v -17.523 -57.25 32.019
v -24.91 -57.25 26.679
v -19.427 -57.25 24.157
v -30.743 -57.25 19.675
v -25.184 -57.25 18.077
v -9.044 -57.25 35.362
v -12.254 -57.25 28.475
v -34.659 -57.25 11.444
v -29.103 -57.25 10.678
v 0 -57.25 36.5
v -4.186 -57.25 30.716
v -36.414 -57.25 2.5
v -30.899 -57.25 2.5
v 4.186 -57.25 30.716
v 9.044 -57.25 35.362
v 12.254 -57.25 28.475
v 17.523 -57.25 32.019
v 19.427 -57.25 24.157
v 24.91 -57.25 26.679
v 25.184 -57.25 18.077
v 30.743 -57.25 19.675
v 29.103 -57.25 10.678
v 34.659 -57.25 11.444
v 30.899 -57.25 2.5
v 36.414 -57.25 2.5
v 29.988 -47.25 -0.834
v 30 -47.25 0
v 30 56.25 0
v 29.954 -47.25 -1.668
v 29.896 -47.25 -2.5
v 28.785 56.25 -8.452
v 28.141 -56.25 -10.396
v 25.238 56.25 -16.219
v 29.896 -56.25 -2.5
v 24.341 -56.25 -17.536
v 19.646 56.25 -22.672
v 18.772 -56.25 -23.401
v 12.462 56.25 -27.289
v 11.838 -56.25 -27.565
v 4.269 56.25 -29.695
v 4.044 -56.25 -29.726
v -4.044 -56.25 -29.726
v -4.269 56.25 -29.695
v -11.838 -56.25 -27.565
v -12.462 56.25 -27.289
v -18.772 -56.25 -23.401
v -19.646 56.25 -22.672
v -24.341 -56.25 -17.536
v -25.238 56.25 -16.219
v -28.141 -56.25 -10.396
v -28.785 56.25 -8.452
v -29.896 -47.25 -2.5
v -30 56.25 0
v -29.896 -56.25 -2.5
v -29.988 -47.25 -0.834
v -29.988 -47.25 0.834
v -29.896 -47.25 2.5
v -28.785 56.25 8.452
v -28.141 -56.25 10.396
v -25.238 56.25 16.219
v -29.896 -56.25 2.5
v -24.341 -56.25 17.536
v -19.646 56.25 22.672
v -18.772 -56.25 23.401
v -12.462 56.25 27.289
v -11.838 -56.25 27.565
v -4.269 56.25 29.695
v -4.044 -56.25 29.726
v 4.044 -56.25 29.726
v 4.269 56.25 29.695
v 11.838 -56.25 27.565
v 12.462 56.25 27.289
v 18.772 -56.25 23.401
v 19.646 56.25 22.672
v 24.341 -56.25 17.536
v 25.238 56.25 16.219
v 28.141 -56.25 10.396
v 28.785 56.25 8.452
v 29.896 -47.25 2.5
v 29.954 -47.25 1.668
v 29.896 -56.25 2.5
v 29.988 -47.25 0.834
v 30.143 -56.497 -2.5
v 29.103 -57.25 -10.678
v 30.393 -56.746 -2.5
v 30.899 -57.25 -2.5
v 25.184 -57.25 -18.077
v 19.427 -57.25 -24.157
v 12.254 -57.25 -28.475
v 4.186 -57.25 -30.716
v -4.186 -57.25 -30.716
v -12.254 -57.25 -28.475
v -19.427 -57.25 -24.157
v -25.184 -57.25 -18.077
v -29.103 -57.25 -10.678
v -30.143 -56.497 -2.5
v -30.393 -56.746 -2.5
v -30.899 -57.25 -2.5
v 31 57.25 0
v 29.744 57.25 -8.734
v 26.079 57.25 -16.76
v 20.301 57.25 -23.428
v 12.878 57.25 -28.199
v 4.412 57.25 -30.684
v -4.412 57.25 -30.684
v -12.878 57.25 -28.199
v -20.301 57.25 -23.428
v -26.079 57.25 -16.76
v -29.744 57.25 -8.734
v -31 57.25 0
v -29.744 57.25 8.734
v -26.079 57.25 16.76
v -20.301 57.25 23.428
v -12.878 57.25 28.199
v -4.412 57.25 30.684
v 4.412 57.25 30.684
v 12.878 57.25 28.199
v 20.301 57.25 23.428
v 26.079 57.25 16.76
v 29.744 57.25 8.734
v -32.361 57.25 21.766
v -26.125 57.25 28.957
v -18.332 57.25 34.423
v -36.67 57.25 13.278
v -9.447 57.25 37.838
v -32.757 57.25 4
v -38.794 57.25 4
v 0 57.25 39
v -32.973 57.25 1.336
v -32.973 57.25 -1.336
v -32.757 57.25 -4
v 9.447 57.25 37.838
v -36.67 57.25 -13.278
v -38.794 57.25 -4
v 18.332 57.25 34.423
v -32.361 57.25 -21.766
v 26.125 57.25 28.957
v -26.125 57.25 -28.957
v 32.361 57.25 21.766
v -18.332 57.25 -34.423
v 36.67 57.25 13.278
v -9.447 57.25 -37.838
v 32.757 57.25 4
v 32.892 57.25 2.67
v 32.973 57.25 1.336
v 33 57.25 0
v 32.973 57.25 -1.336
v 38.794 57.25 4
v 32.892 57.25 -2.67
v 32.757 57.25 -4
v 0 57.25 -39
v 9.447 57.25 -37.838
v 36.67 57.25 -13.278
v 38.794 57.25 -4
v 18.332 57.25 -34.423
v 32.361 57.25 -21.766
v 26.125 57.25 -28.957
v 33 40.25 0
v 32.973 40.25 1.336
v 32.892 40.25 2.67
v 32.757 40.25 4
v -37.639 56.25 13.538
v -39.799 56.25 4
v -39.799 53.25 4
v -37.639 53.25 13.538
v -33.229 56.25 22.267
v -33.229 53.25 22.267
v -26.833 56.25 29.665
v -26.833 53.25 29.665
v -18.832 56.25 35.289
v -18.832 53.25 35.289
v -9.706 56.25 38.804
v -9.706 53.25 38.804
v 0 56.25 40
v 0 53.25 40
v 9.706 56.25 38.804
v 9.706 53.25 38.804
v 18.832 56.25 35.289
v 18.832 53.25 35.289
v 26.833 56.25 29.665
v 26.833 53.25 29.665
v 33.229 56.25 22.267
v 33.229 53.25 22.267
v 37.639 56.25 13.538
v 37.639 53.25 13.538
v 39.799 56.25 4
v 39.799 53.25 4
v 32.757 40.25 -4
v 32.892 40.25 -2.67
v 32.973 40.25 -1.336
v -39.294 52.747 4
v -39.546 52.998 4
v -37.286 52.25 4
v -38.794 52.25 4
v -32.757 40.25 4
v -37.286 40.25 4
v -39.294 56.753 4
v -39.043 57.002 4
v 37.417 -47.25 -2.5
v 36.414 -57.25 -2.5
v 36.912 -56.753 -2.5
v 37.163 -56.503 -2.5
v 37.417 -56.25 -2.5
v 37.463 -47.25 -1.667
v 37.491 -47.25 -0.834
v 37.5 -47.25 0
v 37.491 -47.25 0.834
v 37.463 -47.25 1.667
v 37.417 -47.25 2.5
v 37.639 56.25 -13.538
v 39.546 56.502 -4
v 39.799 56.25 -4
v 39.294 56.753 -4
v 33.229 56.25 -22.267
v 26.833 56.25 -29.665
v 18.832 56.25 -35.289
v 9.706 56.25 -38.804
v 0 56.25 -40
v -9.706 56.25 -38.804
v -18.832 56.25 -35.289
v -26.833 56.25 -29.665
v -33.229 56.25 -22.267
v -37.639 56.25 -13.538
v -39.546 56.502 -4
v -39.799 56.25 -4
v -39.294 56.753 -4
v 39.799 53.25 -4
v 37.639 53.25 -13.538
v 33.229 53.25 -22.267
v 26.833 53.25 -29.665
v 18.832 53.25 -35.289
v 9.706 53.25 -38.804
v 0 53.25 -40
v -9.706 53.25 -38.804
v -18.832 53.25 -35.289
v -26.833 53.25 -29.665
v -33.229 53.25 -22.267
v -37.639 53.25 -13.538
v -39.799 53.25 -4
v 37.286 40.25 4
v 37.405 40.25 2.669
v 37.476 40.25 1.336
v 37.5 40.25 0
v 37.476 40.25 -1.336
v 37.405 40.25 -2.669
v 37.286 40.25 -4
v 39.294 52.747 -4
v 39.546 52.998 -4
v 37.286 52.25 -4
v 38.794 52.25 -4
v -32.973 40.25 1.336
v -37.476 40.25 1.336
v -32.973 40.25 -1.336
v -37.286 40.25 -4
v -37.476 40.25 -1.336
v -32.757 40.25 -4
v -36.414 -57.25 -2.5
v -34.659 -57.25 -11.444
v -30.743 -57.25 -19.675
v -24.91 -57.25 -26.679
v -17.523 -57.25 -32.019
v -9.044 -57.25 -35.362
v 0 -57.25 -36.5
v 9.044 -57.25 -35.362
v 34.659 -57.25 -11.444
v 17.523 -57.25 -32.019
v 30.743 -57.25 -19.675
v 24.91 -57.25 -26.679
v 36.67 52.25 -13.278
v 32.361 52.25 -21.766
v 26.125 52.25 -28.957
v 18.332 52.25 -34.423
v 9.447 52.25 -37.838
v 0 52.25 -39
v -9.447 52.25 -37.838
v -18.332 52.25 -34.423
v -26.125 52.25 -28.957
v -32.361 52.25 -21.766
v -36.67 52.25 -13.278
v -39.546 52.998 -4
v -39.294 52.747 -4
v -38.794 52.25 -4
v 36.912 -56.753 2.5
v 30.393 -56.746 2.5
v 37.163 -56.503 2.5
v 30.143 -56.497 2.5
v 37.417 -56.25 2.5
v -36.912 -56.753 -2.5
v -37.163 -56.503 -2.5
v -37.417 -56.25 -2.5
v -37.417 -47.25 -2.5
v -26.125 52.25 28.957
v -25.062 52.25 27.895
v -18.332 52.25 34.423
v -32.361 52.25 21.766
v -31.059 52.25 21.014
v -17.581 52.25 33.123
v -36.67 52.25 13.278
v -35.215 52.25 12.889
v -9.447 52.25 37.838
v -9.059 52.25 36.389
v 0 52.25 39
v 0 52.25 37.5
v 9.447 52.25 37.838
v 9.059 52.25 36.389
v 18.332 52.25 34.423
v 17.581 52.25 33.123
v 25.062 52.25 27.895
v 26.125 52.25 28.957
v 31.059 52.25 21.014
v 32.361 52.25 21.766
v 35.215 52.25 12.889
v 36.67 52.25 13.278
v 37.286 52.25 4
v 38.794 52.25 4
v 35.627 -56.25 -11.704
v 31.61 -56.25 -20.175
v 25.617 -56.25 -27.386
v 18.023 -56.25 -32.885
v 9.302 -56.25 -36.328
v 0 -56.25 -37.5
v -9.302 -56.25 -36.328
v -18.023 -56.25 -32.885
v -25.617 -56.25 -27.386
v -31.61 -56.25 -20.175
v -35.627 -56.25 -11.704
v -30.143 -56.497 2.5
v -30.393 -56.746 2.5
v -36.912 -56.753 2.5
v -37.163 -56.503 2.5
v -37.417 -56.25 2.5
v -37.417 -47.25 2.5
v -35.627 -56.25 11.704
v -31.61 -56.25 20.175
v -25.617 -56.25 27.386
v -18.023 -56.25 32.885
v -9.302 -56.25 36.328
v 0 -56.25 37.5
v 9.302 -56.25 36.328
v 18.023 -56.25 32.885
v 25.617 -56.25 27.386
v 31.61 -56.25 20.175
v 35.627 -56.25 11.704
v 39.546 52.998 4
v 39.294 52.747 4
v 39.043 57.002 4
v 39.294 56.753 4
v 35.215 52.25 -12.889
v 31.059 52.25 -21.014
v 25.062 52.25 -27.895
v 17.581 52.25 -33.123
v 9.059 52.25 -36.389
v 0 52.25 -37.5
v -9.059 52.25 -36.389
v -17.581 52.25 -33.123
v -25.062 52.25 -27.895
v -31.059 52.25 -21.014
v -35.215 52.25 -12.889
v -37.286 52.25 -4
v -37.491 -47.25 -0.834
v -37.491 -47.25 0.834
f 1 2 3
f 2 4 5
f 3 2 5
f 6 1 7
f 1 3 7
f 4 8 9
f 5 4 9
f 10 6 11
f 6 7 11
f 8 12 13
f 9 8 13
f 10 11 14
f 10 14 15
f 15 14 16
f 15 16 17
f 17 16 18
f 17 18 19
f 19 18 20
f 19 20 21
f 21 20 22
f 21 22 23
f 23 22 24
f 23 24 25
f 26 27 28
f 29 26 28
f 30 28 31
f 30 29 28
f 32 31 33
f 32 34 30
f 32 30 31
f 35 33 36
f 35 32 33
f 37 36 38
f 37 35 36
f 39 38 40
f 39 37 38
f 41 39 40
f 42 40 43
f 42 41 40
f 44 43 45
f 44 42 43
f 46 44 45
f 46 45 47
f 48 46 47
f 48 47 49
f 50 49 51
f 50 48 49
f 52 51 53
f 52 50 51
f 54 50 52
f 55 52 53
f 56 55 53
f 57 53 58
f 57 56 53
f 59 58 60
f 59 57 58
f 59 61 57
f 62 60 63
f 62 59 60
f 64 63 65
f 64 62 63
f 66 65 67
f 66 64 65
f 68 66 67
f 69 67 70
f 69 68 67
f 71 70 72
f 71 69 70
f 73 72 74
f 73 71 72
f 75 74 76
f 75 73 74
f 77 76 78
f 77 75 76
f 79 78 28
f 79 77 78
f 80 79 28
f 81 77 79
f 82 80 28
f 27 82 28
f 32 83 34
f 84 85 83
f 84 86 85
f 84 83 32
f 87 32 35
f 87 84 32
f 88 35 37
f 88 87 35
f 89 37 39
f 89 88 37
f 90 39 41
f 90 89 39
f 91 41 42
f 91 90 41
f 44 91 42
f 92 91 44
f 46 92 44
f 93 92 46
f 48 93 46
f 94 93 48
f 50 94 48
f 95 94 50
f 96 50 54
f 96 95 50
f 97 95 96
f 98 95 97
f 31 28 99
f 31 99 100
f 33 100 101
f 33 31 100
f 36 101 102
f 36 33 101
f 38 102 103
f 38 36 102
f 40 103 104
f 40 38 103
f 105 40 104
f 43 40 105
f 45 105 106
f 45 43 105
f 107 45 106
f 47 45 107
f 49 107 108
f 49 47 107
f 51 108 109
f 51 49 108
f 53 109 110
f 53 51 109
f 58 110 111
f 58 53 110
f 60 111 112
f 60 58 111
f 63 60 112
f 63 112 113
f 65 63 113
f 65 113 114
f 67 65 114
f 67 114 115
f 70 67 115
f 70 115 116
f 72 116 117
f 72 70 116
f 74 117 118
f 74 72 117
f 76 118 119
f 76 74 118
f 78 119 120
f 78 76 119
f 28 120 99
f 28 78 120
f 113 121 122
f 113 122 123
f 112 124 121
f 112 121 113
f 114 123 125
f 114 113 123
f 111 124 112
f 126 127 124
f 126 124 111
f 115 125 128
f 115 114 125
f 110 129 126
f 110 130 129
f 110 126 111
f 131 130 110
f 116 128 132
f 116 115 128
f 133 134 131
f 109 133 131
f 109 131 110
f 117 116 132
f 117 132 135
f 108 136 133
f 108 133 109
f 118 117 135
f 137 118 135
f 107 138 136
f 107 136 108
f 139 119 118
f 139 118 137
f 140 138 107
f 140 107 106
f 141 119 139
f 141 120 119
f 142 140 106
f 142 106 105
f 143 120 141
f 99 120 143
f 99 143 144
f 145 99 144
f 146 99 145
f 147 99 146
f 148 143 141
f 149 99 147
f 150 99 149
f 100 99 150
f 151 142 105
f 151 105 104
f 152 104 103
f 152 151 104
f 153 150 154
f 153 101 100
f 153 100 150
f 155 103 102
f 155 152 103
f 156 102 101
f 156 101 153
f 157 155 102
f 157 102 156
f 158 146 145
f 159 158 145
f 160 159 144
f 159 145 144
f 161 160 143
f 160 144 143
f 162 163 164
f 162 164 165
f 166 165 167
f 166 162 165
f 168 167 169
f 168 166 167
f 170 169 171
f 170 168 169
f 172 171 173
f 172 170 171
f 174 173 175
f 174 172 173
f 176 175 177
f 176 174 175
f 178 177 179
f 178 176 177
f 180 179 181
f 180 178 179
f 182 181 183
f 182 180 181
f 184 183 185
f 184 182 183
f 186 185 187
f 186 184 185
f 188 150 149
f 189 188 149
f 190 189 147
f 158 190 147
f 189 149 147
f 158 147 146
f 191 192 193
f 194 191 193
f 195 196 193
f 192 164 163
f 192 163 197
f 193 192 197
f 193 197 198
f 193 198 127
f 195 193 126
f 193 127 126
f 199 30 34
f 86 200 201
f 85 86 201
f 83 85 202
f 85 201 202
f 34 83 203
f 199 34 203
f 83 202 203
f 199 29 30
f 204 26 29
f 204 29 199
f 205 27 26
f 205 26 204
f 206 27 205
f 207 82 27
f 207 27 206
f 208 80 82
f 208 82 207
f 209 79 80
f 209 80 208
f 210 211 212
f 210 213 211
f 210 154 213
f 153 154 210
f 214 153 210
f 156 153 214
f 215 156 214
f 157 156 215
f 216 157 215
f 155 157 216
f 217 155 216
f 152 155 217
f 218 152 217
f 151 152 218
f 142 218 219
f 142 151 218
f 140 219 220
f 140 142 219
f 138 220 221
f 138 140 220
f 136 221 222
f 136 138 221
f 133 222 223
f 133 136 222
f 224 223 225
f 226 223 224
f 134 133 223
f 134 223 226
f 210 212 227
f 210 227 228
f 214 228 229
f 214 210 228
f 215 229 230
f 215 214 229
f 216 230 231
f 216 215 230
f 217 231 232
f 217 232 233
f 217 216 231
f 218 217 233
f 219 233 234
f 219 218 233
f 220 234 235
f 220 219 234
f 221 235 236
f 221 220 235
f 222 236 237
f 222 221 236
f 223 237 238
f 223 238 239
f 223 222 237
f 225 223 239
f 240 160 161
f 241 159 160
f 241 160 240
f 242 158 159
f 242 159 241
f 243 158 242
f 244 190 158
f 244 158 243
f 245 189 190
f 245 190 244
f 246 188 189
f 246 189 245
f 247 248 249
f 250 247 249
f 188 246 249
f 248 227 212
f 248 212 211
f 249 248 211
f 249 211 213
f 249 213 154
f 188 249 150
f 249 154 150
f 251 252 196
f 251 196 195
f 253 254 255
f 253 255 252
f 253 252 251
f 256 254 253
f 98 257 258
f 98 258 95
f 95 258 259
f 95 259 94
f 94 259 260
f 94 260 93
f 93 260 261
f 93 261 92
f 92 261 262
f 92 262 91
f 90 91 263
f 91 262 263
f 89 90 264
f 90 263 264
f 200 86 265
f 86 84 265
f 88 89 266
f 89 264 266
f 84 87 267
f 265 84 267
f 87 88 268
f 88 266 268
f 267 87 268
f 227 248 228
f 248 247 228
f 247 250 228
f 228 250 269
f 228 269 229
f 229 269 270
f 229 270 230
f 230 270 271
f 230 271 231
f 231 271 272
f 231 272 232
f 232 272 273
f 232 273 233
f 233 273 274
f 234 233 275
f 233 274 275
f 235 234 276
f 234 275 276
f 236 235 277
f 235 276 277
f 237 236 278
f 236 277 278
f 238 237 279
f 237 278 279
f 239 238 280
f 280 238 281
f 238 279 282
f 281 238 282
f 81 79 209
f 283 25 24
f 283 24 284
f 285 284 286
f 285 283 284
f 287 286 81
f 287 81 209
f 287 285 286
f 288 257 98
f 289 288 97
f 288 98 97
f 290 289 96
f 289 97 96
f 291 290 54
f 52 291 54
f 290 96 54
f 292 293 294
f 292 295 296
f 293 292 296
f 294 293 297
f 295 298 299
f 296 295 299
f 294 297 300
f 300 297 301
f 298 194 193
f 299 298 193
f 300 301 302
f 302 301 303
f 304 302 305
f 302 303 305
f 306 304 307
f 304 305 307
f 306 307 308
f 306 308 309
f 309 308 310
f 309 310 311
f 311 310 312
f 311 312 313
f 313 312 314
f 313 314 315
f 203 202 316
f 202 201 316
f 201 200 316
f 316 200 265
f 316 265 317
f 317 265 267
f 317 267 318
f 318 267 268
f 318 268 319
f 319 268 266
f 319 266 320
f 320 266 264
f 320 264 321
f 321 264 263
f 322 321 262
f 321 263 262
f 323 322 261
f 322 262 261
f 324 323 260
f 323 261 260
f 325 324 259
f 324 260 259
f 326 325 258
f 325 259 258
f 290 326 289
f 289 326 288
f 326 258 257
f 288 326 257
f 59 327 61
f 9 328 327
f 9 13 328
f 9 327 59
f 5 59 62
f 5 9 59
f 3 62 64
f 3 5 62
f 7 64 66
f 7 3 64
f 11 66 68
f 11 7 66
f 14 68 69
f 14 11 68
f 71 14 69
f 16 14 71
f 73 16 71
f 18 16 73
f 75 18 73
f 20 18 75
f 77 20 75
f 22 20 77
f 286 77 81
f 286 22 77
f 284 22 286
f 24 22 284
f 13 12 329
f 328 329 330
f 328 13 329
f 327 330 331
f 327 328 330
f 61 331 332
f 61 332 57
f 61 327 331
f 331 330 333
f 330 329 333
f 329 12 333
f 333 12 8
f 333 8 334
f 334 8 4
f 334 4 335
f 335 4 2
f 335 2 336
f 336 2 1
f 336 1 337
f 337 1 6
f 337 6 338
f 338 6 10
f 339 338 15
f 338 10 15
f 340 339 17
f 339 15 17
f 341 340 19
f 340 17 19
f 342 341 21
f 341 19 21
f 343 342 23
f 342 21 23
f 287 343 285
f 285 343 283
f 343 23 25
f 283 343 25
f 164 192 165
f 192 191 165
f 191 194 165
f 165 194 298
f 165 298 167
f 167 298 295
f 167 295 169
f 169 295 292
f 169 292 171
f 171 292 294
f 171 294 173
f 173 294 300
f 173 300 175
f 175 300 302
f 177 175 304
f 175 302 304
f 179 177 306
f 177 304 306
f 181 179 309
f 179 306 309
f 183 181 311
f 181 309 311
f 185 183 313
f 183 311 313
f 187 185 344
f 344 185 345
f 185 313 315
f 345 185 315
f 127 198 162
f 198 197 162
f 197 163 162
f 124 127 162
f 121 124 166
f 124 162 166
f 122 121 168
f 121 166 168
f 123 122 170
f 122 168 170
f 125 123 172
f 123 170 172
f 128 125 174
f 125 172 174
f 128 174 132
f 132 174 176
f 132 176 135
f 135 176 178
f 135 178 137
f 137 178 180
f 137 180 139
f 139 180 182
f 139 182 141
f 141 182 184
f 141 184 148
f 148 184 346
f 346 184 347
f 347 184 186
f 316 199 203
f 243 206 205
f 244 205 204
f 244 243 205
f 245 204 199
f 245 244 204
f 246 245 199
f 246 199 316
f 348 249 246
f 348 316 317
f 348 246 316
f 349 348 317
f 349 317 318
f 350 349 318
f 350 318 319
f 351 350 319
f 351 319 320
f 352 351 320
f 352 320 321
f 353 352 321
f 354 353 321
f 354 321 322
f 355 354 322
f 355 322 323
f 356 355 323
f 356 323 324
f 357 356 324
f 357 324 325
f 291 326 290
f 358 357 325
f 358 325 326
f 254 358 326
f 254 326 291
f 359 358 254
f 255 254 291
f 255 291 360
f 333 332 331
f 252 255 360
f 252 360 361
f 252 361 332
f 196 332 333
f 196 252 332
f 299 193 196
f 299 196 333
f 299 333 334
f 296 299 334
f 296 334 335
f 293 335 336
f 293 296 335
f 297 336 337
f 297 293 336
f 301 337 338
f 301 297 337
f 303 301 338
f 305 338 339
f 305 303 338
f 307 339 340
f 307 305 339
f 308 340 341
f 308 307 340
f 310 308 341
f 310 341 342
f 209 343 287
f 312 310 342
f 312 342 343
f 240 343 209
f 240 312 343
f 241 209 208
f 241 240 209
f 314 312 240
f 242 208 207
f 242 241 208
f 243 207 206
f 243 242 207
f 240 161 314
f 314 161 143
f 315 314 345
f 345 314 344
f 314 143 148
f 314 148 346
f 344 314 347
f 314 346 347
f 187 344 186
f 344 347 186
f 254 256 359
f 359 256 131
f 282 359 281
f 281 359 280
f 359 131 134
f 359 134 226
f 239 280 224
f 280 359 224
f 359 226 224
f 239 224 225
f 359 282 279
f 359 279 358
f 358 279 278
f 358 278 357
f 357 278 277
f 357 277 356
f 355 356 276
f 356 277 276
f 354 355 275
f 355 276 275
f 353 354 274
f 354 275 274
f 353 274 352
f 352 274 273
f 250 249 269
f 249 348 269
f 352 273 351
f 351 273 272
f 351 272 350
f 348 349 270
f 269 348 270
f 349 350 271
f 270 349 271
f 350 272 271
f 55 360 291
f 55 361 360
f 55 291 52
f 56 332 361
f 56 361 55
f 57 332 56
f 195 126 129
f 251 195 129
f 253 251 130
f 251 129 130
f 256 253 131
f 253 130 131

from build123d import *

# Parameters (mm, degrees)
SKETCH1_R           = 37.5
SKETCH1_R_2         = 30
BOSS_EXTRUDE1_DEPTH = 57.25
SKETCH2_R           = 40
SKETCH2_R_2         = 37.5
BOSS_EXTRUDE2_DEPTH = 5
SKETCH3_W           = 90
SKETCH3_H           = 5
CUT_EXTRUDE1_DEPTH  = 10
CUT_EXTRUDE2_DEPTH  = 17
CHAMFER1_SIZE       = 1


with BuildPart() as part:
    # Sketch1 → Boss-Extrude1 (new body, symmetric)
    with BuildSketch(Plane(origin=(0, 0, 0), x_dir=(1, 0, 0), z_dir=(0, 1, 0))):
        Circle(SKETCH1_R)
        Circle(SKETCH1_R_2, mode=Mode.SUBTRACT)
    extrude(amount=BOSS_EXTRUDE1_DEPTH, both=True)

    # Sketch2 → Boss-Extrude2 (add)
    with BuildSketch(Plane(origin=(0, 57.25, 0), x_dir=(1, 0, 0), z_dir=(0, 1, 0))):
        Circle(SKETCH2_R)
        Circle(SKETCH2_R_2, mode=Mode.SUBTRACT)
    extrude(amount=-BOSS_EXTRUDE2_DEPTH)

    # Sketch3 → Cut-Extrude1 (cut)
    with BuildSketch(Plane.XZ.offset(57.25)):
        Rectangle(SKETCH3_W, SKETCH3_H)
    extrude(amount=-CUT_EXTRUDE1_DEPTH, mode=Mode.SUBTRACT)

    # Sketch4 → Cut-Extrude2 (cut)
    with BuildSketch(Plane(origin=(0, 57.25, 0), x_dir=(1, 0, 0), z_dir=(0, 1, 0))):
        with BuildLine():
            Line((32.756678708, -4), (39.799497484, -4))
            ThreePointArc((39.799497484, -4), (39.949842924, -2.002511002), (40, 0))
            ThreePointArc((40, 0), (39.949842924, 2.002511002), (39.799497484, 4))
            Line((39.799497484, 4), (32.756678708, 4))
            ThreePointArc((32.756678708, 4), (32.939113508, 2.003696911), (33, 0))
            ThreePointArc((33, 0), (32.939113508, -2.003696911), (32.756678708, -4))
        make_face()
        with BuildLine():
            ThreePointArc((-39.799497484, 4), (-40, 0), (-39.799497484, -4))
            Line((-39.799497484, -4), (-32.756678708, -4))
            ThreePointArc((-32.756678708, -4), (-33, 0), (-32.756678708, 4))
            Line((-32.756678708, 4), (-39.799497484, 4))
        make_face()
    extrude(amount=-CUT_EXTRUDE2_DEPTH, mode=Mode.SUBTRACT)

    # Chamfer1
    chamfer1_edges = [part.edges().sort_by_distance(p)[0] for p in [
        (0, 57.25, 40),
        (-30, 57.25, 0),
        (0, -57.25, -30),
        (0, -57.25, 30),
        (0, -57.25, -37.5),
        (0, -57.25, 37.5),
        (0, 52.25, -40),
        (0, 52.25, 40),
        (0, 57.25, -40),
    ]]
    chamfer(chamfer1_edges, length=CHAMFER1_SIZE)


solid = part.part
